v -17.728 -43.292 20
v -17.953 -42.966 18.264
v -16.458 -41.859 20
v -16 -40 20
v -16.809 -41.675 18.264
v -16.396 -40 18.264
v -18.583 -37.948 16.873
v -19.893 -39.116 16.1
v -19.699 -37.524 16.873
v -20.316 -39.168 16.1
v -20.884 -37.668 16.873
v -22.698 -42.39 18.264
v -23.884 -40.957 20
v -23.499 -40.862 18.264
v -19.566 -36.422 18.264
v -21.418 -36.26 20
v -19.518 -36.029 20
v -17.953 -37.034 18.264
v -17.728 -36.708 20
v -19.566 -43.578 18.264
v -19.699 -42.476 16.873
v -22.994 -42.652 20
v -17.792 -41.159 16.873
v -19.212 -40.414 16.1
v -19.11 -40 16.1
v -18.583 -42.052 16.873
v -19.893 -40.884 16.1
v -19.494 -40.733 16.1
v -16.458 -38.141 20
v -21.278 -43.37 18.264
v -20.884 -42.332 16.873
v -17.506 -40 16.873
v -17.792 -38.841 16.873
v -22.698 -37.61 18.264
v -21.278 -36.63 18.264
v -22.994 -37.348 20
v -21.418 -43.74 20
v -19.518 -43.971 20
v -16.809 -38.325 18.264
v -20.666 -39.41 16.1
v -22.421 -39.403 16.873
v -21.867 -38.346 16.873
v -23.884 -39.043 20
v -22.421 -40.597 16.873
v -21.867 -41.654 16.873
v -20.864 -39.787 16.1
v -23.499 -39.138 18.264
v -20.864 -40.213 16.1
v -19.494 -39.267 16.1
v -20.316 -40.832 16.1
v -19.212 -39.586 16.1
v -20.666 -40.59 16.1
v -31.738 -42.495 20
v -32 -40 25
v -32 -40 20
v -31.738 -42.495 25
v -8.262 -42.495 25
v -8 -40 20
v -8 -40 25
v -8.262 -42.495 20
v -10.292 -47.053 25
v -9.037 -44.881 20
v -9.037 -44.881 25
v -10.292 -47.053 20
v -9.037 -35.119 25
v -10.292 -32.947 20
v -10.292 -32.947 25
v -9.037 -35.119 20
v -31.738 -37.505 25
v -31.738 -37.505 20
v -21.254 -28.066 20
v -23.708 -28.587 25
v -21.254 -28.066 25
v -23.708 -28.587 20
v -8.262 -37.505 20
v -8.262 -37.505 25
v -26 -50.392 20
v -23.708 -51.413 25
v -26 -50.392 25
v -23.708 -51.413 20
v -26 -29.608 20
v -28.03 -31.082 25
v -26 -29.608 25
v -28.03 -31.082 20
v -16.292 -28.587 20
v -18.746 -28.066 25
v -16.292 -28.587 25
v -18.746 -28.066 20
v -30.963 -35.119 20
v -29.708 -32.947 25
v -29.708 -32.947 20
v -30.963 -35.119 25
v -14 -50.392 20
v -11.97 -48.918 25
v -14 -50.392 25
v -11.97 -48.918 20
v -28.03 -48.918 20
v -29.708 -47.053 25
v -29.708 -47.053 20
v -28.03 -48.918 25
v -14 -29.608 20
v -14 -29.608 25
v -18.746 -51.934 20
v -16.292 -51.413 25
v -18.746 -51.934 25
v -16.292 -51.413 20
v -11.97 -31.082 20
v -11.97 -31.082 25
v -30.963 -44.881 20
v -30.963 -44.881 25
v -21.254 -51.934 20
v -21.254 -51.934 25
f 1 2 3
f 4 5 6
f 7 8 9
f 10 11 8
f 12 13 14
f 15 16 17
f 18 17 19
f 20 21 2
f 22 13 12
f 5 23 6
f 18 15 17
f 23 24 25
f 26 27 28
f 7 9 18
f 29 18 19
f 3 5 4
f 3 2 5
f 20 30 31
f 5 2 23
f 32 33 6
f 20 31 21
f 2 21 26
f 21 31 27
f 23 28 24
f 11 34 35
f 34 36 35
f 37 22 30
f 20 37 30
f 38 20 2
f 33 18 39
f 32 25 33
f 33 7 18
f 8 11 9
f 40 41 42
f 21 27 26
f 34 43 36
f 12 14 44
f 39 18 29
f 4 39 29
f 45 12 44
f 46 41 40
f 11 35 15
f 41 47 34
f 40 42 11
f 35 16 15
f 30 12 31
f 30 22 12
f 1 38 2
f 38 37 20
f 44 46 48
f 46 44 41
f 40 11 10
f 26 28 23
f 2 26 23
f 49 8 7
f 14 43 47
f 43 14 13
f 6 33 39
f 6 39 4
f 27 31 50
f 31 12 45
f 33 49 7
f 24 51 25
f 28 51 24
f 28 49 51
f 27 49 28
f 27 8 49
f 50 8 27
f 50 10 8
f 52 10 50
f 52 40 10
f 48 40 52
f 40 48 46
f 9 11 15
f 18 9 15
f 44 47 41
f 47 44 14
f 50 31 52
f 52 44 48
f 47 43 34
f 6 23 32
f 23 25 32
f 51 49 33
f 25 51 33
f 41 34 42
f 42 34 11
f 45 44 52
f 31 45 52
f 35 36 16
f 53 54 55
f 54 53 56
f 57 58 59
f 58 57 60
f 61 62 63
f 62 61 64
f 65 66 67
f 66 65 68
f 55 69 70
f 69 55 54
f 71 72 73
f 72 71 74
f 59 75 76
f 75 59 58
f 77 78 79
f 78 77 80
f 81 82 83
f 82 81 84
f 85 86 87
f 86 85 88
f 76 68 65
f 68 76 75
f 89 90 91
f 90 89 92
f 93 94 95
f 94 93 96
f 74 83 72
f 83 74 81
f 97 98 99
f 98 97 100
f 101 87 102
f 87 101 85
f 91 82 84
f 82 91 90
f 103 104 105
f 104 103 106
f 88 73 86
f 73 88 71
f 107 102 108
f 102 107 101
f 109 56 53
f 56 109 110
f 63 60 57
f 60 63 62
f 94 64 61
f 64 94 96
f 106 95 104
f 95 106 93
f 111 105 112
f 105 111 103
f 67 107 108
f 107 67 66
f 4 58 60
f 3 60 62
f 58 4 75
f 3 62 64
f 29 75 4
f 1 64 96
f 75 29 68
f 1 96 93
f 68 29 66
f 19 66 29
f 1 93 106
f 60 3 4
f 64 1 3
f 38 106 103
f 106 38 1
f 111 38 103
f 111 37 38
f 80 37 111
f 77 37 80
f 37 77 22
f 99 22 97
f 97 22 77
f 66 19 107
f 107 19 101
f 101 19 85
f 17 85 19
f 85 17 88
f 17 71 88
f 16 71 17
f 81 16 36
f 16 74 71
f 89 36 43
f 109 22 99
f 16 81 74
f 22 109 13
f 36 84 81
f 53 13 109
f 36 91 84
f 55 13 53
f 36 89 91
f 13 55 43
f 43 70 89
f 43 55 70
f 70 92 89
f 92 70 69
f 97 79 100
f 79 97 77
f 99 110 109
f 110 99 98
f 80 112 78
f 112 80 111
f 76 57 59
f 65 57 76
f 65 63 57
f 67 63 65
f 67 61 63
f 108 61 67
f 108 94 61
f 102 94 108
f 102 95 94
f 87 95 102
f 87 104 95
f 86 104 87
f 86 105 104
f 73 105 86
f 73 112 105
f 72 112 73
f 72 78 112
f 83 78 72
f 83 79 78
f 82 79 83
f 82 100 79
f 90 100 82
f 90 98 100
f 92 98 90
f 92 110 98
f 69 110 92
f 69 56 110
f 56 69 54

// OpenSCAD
// Generated by generate_scads.py
translate([-20,-30,20]) {
  translate([0,-10,0]) {
    union() {
      sphere(r=4);
      cylinder(h=5, r=12, center=false);
    }
  }
}
